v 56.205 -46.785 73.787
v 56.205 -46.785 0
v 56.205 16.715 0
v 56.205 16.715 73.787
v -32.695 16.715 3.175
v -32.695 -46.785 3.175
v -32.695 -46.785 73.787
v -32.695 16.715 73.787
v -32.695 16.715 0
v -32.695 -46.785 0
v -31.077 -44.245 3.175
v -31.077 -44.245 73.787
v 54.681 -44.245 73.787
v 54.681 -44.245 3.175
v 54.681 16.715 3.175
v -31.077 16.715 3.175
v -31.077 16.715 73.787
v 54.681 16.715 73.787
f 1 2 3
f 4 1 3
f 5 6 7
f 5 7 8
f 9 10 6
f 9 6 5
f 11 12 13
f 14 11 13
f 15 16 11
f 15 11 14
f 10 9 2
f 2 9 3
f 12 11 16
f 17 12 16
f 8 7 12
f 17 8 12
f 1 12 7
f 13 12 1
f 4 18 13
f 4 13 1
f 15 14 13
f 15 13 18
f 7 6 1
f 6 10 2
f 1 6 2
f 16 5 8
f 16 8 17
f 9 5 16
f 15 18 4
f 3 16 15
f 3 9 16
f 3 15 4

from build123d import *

# Parameters (mm, degrees)
SKETCH1_W           = 88.9
SKETCH1_H           = 63.5
BOSS_EXTRUDE1_DEPTH = 3.175
SKETCH4_W           = 1.617754759
SKETCH4_H           = 63.5
BOSS_EXTRUDE2_DEPTH = 70.612
SKETCH5_W           = 1.524
SKETCH5_H           = 63.5
BOSS_EXTRUDE3_DEPTH = 70.612
SKETCH6_W           = 88.9
SKETCH6_H           = 73.787
BOSS_EXTRUDE4_DEPTH = 2.54


with BuildPart() as part:
    # Sketch1 → Boss-Extrude1 (new body)
    with BuildSketch(Plane.XY):
        with Locations((11.755371901, -15.035330579)):
            Rectangle(SKETCH1_W, SKETCH1_H)
    extrude(amount=BOSS_EXTRUDE1_DEPTH)

    # Sketch4 → Boss-Extrude2 (add)
    with BuildSketch(Plane.XY.offset(3.175)):
        with Locations((-31.88575072, -15.035330579)):
            Rectangle(SKETCH4_W, SKETCH4_H)
    extrude(amount=BOSS_EXTRUDE2_DEPTH)

    # Sketch5 → Boss-Extrude3 (add)
    with BuildSketch(Plane.XY.offset(3.175)):
        with Locations((55.443371901, -15.035330579)):
            Rectangle(SKETCH5_W, SKETCH5_H)
    extrude(amount=BOSS_EXTRUDE3_DEPTH)

    # Sketch6 → Boss-Extrude4 (add)
    with BuildSketch(Plane.XZ.offset(46.785330579)):
        with Locations((11.755371901, 36.8935)):
            Rectangle(SKETCH6_W, SKETCH6_H)
    extrude(amount=-BOSS_EXTRUDE4_DEPTH)


solid = part.part
